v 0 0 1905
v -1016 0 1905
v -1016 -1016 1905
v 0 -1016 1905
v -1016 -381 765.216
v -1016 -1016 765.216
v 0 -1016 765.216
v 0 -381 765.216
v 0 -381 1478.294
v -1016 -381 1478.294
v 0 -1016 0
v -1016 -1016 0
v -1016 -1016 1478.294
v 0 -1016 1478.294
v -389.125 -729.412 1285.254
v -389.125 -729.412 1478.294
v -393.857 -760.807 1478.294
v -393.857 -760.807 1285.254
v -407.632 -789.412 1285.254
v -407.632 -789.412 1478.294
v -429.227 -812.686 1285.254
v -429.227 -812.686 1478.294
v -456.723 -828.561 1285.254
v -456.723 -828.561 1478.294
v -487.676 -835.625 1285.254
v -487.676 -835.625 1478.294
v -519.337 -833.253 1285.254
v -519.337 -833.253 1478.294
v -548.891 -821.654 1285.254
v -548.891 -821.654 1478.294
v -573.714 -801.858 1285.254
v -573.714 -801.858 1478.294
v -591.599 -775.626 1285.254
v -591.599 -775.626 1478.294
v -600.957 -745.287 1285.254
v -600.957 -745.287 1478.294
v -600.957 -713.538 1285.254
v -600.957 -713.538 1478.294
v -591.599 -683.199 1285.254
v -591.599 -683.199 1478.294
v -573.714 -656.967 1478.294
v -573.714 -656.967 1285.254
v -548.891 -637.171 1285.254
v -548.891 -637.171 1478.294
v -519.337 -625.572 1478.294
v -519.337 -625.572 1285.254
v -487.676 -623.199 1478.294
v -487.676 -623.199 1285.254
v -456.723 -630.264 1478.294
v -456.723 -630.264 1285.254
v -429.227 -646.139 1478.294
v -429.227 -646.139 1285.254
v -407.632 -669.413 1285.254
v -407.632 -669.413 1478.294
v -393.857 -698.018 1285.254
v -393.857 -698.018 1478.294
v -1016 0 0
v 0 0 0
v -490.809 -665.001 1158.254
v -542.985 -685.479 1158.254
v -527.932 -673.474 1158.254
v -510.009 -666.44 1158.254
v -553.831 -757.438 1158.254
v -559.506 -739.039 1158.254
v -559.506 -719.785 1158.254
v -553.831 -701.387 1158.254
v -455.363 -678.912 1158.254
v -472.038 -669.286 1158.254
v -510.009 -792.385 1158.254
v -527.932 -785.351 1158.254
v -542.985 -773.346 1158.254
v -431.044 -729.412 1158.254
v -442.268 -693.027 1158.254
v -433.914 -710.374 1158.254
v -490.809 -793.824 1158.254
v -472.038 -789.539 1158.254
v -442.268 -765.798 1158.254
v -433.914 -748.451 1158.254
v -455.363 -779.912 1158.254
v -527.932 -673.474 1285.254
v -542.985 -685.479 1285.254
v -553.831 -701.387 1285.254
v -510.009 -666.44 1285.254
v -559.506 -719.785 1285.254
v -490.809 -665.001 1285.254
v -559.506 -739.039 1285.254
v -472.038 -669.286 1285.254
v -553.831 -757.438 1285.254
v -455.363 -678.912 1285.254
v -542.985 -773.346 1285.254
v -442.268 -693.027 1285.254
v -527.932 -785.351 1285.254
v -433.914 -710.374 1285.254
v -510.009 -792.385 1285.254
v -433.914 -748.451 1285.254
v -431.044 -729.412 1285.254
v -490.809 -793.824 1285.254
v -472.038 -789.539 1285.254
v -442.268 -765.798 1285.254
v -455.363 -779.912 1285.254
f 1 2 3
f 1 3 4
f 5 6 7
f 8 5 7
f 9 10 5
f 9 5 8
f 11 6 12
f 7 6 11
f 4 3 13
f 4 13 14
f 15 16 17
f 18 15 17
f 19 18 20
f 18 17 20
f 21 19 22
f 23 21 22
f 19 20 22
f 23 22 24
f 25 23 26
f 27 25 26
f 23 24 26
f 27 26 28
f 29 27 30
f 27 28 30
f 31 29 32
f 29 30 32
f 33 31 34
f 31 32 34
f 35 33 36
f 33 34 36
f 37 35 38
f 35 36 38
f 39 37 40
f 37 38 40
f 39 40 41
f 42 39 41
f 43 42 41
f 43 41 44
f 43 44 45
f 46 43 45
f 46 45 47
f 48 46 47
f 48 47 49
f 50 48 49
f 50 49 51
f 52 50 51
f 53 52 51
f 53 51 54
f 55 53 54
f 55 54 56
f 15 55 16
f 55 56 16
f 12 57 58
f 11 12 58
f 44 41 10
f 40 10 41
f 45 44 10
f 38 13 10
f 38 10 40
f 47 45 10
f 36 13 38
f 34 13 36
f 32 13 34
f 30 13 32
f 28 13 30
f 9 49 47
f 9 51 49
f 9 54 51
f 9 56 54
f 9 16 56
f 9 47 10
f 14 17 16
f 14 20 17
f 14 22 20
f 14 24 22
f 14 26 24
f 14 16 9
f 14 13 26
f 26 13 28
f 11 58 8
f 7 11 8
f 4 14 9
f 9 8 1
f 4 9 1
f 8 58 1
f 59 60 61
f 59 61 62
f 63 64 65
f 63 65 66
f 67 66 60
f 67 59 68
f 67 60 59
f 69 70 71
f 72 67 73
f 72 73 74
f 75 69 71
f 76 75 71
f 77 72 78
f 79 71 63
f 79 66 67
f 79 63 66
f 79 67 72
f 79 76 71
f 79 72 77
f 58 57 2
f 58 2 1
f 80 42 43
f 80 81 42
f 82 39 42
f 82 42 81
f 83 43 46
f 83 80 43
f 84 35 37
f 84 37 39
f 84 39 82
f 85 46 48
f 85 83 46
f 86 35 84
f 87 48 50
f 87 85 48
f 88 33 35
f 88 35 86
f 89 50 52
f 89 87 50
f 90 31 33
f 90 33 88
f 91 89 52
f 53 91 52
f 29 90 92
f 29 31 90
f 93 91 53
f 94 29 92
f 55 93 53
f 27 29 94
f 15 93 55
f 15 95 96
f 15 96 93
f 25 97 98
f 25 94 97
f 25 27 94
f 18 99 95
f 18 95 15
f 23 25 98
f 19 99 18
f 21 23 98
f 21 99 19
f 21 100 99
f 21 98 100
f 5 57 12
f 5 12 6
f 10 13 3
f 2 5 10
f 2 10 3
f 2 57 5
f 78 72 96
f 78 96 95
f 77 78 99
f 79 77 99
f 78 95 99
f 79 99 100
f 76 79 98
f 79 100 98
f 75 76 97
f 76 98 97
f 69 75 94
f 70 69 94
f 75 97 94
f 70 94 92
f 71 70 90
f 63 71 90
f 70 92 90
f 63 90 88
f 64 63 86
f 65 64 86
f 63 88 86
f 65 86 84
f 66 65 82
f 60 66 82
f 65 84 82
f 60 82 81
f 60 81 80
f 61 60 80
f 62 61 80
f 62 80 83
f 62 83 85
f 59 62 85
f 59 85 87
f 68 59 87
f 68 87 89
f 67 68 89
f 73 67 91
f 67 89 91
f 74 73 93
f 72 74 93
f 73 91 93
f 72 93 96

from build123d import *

# Parameters (mm, degrees)
F0_W     = 1016
F0_H     = 1905
F1_DEPTH = 1016
F2_W     = 1016
F2_H     = 713.0777835846
F3_DEPTH = 635
F4_R     = 106.5109159408
F5_DEPTH = 193.04
F6_R     = 64.5918203827
F7_DEPTH = 127


# Not quite as in the source:
# - the program builds the solid bodies; features that only make, move or delete a surface that nothing else refers to are left out


with BuildPart() as f1:
    # F0 (on Front) → F1 (new body)
    with BuildSketch(Plane.XZ):
        with Locations((-508, 952.5)):
            Rectangle(F0_W, F0_H)
    extrude(amount=F1_DEPTH)

    # F2 (on face) → F3 (cut)
    with BuildSketch(Plane.XZ.offset(1016)):
        with Locations((-508, 1121.7548847198)):
            Rectangle(F2_W, F2_H)
    extrude(amount=-F3_DEPTH, mode=Mode.SUBTRACT)

    # F4 (on face) → F5 (join)
    with BuildSketch(Plane(origin=(0, 0, 1478.2937765121), x_dir=(1, 0, 0), z_dir=(0, 0, -1))):
        with Locations((-495.6358075142, 729.4123768806)):
            Circle(F4_R)
    extrude(amount=F5_DEPTH)

    # F6 (on face) → F7 (join)
    with BuildSketch(Plane(origin=(0, 0, 1285.2537765121), x_dir=(1, 0, 0), z_dir=(0, 0, -1))):
        with Locations((-495.6358075142, 729.4123768806)):
            Circle(F6_R)
    extrude(amount=F7_DEPTH)


solid = f1.part
